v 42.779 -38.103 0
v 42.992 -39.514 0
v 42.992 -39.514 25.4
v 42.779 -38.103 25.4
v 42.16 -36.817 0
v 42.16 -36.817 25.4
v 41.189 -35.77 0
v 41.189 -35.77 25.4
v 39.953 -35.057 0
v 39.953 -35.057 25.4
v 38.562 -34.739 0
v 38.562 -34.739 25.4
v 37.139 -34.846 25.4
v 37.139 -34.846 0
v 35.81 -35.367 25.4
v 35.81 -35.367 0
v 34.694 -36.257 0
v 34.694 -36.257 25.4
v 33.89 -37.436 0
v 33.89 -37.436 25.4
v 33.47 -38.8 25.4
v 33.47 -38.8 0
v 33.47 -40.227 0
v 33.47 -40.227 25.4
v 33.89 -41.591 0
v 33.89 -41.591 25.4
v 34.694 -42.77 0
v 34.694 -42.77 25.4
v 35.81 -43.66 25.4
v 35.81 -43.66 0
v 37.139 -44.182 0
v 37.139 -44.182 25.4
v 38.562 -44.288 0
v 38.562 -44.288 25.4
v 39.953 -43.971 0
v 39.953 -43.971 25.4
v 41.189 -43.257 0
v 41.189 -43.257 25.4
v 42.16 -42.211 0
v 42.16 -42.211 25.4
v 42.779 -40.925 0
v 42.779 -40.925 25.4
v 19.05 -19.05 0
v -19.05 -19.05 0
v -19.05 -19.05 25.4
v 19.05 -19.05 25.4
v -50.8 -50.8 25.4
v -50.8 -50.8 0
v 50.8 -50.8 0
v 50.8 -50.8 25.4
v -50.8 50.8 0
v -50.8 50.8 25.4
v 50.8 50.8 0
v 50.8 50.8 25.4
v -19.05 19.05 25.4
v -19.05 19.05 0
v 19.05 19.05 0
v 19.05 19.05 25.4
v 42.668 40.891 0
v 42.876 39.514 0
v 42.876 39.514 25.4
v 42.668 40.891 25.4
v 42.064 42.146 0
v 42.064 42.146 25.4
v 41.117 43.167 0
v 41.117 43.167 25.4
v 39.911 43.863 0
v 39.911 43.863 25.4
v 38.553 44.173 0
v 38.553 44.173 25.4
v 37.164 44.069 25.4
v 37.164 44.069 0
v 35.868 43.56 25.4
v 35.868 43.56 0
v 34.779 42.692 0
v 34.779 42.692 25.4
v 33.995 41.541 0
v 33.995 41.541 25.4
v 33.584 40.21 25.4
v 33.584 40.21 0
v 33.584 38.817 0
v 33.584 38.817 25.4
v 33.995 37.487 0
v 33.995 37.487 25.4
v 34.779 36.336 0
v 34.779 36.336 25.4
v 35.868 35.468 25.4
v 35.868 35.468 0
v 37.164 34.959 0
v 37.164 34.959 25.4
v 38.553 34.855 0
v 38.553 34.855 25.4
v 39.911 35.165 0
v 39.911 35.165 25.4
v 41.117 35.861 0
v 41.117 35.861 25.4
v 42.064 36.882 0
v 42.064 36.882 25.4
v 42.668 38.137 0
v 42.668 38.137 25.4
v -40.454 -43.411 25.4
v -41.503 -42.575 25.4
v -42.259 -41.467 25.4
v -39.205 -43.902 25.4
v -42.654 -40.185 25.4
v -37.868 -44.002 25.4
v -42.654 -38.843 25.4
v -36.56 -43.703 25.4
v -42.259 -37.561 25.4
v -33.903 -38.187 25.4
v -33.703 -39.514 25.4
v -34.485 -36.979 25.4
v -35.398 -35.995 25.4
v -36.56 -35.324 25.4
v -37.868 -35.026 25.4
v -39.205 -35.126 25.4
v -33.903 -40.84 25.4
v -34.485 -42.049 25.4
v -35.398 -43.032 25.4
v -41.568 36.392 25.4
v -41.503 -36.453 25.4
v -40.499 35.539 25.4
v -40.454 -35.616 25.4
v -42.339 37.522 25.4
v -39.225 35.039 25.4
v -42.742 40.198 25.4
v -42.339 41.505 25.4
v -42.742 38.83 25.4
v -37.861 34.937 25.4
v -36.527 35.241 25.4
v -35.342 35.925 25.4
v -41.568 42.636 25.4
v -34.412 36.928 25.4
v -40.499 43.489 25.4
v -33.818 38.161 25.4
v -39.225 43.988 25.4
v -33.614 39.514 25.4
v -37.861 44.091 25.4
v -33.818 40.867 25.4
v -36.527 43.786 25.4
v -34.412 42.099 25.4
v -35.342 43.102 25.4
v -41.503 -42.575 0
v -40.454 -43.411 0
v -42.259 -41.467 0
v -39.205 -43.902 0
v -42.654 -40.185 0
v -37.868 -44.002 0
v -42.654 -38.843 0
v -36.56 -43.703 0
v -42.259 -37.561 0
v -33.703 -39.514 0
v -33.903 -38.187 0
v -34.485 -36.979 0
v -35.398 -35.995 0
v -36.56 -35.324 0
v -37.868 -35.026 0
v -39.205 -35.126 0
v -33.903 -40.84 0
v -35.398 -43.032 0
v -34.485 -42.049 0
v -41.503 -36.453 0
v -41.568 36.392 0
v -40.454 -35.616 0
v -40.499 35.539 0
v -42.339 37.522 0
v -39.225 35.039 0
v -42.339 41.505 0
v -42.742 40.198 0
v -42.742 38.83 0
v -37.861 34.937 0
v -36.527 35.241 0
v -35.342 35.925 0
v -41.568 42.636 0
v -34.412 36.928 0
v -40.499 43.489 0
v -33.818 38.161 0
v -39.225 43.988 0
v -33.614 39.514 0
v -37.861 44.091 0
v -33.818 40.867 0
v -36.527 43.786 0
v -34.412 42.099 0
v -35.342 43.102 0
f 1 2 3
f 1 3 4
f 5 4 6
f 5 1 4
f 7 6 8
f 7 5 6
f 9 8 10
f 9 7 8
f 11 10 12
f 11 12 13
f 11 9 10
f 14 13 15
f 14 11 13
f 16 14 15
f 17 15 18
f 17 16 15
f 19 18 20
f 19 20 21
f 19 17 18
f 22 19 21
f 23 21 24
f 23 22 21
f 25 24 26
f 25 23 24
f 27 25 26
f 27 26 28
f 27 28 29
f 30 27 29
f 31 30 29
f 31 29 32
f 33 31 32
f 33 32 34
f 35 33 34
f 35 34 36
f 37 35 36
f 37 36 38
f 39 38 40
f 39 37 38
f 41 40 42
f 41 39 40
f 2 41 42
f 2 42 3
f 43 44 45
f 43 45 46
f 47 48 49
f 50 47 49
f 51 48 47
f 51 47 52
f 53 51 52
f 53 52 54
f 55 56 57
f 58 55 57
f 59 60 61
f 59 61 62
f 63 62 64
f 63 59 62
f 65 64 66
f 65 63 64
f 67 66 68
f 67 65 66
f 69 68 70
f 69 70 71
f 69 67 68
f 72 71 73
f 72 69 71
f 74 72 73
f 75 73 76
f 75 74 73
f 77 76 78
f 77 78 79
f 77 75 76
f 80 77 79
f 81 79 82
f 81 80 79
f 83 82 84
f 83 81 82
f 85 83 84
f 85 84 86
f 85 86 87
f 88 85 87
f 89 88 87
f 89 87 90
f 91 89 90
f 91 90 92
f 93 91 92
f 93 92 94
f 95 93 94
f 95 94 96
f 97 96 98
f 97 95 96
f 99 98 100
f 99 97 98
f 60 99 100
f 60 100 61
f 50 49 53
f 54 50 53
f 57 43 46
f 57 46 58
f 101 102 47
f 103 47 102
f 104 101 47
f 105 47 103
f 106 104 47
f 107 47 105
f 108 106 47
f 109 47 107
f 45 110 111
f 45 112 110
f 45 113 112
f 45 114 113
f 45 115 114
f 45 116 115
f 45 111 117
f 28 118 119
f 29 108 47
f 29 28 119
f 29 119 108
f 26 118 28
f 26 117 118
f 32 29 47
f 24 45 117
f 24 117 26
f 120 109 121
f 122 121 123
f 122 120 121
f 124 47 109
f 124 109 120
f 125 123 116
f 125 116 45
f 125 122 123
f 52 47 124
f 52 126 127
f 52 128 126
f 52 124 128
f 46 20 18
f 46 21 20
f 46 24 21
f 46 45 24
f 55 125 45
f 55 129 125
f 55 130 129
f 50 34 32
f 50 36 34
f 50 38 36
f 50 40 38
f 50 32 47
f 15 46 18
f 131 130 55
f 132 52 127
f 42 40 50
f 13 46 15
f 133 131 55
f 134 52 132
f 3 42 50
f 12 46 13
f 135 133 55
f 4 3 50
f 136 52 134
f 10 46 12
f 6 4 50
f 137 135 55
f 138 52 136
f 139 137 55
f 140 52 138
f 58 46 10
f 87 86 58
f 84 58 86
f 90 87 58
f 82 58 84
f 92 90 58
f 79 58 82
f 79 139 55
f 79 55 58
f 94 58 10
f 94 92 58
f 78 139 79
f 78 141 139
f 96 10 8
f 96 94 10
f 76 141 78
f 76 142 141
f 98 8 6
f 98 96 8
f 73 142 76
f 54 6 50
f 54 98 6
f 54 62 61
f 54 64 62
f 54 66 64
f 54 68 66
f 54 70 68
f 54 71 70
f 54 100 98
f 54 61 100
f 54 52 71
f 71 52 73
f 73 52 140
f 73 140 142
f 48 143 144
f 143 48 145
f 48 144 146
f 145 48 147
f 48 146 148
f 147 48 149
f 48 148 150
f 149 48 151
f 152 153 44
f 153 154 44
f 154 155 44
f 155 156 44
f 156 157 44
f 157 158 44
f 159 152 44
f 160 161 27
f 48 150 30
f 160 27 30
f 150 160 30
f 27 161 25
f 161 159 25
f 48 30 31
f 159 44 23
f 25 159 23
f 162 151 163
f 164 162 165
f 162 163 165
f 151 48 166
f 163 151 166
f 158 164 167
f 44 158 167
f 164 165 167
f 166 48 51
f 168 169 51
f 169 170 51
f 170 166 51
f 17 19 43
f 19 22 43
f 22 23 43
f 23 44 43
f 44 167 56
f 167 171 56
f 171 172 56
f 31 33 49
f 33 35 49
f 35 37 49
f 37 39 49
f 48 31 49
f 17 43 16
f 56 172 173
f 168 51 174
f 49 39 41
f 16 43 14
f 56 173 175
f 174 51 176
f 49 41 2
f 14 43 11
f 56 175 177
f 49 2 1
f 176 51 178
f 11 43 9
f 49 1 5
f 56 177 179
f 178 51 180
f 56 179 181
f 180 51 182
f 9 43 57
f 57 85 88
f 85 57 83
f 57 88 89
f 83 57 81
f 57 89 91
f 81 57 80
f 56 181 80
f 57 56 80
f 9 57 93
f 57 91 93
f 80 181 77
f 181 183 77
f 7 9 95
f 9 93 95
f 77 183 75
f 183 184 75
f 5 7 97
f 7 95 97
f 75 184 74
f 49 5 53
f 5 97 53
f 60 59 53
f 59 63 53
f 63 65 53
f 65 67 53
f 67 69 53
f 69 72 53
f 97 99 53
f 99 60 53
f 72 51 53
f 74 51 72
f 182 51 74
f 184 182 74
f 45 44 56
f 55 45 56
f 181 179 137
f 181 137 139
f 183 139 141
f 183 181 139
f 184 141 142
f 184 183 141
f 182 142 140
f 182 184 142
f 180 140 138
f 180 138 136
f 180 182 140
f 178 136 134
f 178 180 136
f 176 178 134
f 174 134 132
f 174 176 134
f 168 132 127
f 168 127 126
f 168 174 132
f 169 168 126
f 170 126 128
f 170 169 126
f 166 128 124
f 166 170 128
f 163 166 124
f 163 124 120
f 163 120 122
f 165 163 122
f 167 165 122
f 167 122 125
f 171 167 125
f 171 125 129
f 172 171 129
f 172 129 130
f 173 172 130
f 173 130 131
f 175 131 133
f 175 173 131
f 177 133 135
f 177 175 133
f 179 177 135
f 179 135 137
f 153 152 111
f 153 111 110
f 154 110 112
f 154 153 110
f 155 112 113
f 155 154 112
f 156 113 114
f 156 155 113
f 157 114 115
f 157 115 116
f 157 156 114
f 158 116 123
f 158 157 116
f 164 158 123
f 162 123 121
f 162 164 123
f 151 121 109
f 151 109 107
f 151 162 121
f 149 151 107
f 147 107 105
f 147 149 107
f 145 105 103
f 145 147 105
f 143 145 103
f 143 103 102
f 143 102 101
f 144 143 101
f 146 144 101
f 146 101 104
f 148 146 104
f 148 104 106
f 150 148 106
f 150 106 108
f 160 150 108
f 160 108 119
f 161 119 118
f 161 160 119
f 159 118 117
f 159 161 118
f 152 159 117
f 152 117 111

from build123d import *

# Parameters (mm, degrees)
F0_W     = 101.6
F0_H     = 101.6
F0_R     = 4.50054
F0_W_2   = 38.1
F0_H_2   = 38.1
F0_R_2   = 4.787872
F0_R_3   = 4.589665
F0_R_4   = 4.672002
F1_DEPTH = 25.4


with BuildPart() as f1:
    # F0 (on Top) → F1 (new body)
    with BuildSketch(Plane.XY):
        Rectangle(F0_W, F0_H)
        with Locations((-38.203955, -39.513808)):
            Circle(F0_R, mode=Mode.SUBTRACT)
        Rectangle(F0_W_2, F0_H_2, mode=Mode.SUBTRACT)
        with Locations((38.203955, -39.513808)):
            Circle(F0_R_2, mode=Mode.SUBTRACT)
        with Locations((-38.203955, 39.513808)):
            Circle(F0_R_3, mode=Mode.SUBTRACT)
        with Locations((38.203955, 39.513808)):
            Circle(F0_R_4, mode=Mode.SUBTRACT)
    extrude(amount=F1_DEPTH)


solid = f1.part
